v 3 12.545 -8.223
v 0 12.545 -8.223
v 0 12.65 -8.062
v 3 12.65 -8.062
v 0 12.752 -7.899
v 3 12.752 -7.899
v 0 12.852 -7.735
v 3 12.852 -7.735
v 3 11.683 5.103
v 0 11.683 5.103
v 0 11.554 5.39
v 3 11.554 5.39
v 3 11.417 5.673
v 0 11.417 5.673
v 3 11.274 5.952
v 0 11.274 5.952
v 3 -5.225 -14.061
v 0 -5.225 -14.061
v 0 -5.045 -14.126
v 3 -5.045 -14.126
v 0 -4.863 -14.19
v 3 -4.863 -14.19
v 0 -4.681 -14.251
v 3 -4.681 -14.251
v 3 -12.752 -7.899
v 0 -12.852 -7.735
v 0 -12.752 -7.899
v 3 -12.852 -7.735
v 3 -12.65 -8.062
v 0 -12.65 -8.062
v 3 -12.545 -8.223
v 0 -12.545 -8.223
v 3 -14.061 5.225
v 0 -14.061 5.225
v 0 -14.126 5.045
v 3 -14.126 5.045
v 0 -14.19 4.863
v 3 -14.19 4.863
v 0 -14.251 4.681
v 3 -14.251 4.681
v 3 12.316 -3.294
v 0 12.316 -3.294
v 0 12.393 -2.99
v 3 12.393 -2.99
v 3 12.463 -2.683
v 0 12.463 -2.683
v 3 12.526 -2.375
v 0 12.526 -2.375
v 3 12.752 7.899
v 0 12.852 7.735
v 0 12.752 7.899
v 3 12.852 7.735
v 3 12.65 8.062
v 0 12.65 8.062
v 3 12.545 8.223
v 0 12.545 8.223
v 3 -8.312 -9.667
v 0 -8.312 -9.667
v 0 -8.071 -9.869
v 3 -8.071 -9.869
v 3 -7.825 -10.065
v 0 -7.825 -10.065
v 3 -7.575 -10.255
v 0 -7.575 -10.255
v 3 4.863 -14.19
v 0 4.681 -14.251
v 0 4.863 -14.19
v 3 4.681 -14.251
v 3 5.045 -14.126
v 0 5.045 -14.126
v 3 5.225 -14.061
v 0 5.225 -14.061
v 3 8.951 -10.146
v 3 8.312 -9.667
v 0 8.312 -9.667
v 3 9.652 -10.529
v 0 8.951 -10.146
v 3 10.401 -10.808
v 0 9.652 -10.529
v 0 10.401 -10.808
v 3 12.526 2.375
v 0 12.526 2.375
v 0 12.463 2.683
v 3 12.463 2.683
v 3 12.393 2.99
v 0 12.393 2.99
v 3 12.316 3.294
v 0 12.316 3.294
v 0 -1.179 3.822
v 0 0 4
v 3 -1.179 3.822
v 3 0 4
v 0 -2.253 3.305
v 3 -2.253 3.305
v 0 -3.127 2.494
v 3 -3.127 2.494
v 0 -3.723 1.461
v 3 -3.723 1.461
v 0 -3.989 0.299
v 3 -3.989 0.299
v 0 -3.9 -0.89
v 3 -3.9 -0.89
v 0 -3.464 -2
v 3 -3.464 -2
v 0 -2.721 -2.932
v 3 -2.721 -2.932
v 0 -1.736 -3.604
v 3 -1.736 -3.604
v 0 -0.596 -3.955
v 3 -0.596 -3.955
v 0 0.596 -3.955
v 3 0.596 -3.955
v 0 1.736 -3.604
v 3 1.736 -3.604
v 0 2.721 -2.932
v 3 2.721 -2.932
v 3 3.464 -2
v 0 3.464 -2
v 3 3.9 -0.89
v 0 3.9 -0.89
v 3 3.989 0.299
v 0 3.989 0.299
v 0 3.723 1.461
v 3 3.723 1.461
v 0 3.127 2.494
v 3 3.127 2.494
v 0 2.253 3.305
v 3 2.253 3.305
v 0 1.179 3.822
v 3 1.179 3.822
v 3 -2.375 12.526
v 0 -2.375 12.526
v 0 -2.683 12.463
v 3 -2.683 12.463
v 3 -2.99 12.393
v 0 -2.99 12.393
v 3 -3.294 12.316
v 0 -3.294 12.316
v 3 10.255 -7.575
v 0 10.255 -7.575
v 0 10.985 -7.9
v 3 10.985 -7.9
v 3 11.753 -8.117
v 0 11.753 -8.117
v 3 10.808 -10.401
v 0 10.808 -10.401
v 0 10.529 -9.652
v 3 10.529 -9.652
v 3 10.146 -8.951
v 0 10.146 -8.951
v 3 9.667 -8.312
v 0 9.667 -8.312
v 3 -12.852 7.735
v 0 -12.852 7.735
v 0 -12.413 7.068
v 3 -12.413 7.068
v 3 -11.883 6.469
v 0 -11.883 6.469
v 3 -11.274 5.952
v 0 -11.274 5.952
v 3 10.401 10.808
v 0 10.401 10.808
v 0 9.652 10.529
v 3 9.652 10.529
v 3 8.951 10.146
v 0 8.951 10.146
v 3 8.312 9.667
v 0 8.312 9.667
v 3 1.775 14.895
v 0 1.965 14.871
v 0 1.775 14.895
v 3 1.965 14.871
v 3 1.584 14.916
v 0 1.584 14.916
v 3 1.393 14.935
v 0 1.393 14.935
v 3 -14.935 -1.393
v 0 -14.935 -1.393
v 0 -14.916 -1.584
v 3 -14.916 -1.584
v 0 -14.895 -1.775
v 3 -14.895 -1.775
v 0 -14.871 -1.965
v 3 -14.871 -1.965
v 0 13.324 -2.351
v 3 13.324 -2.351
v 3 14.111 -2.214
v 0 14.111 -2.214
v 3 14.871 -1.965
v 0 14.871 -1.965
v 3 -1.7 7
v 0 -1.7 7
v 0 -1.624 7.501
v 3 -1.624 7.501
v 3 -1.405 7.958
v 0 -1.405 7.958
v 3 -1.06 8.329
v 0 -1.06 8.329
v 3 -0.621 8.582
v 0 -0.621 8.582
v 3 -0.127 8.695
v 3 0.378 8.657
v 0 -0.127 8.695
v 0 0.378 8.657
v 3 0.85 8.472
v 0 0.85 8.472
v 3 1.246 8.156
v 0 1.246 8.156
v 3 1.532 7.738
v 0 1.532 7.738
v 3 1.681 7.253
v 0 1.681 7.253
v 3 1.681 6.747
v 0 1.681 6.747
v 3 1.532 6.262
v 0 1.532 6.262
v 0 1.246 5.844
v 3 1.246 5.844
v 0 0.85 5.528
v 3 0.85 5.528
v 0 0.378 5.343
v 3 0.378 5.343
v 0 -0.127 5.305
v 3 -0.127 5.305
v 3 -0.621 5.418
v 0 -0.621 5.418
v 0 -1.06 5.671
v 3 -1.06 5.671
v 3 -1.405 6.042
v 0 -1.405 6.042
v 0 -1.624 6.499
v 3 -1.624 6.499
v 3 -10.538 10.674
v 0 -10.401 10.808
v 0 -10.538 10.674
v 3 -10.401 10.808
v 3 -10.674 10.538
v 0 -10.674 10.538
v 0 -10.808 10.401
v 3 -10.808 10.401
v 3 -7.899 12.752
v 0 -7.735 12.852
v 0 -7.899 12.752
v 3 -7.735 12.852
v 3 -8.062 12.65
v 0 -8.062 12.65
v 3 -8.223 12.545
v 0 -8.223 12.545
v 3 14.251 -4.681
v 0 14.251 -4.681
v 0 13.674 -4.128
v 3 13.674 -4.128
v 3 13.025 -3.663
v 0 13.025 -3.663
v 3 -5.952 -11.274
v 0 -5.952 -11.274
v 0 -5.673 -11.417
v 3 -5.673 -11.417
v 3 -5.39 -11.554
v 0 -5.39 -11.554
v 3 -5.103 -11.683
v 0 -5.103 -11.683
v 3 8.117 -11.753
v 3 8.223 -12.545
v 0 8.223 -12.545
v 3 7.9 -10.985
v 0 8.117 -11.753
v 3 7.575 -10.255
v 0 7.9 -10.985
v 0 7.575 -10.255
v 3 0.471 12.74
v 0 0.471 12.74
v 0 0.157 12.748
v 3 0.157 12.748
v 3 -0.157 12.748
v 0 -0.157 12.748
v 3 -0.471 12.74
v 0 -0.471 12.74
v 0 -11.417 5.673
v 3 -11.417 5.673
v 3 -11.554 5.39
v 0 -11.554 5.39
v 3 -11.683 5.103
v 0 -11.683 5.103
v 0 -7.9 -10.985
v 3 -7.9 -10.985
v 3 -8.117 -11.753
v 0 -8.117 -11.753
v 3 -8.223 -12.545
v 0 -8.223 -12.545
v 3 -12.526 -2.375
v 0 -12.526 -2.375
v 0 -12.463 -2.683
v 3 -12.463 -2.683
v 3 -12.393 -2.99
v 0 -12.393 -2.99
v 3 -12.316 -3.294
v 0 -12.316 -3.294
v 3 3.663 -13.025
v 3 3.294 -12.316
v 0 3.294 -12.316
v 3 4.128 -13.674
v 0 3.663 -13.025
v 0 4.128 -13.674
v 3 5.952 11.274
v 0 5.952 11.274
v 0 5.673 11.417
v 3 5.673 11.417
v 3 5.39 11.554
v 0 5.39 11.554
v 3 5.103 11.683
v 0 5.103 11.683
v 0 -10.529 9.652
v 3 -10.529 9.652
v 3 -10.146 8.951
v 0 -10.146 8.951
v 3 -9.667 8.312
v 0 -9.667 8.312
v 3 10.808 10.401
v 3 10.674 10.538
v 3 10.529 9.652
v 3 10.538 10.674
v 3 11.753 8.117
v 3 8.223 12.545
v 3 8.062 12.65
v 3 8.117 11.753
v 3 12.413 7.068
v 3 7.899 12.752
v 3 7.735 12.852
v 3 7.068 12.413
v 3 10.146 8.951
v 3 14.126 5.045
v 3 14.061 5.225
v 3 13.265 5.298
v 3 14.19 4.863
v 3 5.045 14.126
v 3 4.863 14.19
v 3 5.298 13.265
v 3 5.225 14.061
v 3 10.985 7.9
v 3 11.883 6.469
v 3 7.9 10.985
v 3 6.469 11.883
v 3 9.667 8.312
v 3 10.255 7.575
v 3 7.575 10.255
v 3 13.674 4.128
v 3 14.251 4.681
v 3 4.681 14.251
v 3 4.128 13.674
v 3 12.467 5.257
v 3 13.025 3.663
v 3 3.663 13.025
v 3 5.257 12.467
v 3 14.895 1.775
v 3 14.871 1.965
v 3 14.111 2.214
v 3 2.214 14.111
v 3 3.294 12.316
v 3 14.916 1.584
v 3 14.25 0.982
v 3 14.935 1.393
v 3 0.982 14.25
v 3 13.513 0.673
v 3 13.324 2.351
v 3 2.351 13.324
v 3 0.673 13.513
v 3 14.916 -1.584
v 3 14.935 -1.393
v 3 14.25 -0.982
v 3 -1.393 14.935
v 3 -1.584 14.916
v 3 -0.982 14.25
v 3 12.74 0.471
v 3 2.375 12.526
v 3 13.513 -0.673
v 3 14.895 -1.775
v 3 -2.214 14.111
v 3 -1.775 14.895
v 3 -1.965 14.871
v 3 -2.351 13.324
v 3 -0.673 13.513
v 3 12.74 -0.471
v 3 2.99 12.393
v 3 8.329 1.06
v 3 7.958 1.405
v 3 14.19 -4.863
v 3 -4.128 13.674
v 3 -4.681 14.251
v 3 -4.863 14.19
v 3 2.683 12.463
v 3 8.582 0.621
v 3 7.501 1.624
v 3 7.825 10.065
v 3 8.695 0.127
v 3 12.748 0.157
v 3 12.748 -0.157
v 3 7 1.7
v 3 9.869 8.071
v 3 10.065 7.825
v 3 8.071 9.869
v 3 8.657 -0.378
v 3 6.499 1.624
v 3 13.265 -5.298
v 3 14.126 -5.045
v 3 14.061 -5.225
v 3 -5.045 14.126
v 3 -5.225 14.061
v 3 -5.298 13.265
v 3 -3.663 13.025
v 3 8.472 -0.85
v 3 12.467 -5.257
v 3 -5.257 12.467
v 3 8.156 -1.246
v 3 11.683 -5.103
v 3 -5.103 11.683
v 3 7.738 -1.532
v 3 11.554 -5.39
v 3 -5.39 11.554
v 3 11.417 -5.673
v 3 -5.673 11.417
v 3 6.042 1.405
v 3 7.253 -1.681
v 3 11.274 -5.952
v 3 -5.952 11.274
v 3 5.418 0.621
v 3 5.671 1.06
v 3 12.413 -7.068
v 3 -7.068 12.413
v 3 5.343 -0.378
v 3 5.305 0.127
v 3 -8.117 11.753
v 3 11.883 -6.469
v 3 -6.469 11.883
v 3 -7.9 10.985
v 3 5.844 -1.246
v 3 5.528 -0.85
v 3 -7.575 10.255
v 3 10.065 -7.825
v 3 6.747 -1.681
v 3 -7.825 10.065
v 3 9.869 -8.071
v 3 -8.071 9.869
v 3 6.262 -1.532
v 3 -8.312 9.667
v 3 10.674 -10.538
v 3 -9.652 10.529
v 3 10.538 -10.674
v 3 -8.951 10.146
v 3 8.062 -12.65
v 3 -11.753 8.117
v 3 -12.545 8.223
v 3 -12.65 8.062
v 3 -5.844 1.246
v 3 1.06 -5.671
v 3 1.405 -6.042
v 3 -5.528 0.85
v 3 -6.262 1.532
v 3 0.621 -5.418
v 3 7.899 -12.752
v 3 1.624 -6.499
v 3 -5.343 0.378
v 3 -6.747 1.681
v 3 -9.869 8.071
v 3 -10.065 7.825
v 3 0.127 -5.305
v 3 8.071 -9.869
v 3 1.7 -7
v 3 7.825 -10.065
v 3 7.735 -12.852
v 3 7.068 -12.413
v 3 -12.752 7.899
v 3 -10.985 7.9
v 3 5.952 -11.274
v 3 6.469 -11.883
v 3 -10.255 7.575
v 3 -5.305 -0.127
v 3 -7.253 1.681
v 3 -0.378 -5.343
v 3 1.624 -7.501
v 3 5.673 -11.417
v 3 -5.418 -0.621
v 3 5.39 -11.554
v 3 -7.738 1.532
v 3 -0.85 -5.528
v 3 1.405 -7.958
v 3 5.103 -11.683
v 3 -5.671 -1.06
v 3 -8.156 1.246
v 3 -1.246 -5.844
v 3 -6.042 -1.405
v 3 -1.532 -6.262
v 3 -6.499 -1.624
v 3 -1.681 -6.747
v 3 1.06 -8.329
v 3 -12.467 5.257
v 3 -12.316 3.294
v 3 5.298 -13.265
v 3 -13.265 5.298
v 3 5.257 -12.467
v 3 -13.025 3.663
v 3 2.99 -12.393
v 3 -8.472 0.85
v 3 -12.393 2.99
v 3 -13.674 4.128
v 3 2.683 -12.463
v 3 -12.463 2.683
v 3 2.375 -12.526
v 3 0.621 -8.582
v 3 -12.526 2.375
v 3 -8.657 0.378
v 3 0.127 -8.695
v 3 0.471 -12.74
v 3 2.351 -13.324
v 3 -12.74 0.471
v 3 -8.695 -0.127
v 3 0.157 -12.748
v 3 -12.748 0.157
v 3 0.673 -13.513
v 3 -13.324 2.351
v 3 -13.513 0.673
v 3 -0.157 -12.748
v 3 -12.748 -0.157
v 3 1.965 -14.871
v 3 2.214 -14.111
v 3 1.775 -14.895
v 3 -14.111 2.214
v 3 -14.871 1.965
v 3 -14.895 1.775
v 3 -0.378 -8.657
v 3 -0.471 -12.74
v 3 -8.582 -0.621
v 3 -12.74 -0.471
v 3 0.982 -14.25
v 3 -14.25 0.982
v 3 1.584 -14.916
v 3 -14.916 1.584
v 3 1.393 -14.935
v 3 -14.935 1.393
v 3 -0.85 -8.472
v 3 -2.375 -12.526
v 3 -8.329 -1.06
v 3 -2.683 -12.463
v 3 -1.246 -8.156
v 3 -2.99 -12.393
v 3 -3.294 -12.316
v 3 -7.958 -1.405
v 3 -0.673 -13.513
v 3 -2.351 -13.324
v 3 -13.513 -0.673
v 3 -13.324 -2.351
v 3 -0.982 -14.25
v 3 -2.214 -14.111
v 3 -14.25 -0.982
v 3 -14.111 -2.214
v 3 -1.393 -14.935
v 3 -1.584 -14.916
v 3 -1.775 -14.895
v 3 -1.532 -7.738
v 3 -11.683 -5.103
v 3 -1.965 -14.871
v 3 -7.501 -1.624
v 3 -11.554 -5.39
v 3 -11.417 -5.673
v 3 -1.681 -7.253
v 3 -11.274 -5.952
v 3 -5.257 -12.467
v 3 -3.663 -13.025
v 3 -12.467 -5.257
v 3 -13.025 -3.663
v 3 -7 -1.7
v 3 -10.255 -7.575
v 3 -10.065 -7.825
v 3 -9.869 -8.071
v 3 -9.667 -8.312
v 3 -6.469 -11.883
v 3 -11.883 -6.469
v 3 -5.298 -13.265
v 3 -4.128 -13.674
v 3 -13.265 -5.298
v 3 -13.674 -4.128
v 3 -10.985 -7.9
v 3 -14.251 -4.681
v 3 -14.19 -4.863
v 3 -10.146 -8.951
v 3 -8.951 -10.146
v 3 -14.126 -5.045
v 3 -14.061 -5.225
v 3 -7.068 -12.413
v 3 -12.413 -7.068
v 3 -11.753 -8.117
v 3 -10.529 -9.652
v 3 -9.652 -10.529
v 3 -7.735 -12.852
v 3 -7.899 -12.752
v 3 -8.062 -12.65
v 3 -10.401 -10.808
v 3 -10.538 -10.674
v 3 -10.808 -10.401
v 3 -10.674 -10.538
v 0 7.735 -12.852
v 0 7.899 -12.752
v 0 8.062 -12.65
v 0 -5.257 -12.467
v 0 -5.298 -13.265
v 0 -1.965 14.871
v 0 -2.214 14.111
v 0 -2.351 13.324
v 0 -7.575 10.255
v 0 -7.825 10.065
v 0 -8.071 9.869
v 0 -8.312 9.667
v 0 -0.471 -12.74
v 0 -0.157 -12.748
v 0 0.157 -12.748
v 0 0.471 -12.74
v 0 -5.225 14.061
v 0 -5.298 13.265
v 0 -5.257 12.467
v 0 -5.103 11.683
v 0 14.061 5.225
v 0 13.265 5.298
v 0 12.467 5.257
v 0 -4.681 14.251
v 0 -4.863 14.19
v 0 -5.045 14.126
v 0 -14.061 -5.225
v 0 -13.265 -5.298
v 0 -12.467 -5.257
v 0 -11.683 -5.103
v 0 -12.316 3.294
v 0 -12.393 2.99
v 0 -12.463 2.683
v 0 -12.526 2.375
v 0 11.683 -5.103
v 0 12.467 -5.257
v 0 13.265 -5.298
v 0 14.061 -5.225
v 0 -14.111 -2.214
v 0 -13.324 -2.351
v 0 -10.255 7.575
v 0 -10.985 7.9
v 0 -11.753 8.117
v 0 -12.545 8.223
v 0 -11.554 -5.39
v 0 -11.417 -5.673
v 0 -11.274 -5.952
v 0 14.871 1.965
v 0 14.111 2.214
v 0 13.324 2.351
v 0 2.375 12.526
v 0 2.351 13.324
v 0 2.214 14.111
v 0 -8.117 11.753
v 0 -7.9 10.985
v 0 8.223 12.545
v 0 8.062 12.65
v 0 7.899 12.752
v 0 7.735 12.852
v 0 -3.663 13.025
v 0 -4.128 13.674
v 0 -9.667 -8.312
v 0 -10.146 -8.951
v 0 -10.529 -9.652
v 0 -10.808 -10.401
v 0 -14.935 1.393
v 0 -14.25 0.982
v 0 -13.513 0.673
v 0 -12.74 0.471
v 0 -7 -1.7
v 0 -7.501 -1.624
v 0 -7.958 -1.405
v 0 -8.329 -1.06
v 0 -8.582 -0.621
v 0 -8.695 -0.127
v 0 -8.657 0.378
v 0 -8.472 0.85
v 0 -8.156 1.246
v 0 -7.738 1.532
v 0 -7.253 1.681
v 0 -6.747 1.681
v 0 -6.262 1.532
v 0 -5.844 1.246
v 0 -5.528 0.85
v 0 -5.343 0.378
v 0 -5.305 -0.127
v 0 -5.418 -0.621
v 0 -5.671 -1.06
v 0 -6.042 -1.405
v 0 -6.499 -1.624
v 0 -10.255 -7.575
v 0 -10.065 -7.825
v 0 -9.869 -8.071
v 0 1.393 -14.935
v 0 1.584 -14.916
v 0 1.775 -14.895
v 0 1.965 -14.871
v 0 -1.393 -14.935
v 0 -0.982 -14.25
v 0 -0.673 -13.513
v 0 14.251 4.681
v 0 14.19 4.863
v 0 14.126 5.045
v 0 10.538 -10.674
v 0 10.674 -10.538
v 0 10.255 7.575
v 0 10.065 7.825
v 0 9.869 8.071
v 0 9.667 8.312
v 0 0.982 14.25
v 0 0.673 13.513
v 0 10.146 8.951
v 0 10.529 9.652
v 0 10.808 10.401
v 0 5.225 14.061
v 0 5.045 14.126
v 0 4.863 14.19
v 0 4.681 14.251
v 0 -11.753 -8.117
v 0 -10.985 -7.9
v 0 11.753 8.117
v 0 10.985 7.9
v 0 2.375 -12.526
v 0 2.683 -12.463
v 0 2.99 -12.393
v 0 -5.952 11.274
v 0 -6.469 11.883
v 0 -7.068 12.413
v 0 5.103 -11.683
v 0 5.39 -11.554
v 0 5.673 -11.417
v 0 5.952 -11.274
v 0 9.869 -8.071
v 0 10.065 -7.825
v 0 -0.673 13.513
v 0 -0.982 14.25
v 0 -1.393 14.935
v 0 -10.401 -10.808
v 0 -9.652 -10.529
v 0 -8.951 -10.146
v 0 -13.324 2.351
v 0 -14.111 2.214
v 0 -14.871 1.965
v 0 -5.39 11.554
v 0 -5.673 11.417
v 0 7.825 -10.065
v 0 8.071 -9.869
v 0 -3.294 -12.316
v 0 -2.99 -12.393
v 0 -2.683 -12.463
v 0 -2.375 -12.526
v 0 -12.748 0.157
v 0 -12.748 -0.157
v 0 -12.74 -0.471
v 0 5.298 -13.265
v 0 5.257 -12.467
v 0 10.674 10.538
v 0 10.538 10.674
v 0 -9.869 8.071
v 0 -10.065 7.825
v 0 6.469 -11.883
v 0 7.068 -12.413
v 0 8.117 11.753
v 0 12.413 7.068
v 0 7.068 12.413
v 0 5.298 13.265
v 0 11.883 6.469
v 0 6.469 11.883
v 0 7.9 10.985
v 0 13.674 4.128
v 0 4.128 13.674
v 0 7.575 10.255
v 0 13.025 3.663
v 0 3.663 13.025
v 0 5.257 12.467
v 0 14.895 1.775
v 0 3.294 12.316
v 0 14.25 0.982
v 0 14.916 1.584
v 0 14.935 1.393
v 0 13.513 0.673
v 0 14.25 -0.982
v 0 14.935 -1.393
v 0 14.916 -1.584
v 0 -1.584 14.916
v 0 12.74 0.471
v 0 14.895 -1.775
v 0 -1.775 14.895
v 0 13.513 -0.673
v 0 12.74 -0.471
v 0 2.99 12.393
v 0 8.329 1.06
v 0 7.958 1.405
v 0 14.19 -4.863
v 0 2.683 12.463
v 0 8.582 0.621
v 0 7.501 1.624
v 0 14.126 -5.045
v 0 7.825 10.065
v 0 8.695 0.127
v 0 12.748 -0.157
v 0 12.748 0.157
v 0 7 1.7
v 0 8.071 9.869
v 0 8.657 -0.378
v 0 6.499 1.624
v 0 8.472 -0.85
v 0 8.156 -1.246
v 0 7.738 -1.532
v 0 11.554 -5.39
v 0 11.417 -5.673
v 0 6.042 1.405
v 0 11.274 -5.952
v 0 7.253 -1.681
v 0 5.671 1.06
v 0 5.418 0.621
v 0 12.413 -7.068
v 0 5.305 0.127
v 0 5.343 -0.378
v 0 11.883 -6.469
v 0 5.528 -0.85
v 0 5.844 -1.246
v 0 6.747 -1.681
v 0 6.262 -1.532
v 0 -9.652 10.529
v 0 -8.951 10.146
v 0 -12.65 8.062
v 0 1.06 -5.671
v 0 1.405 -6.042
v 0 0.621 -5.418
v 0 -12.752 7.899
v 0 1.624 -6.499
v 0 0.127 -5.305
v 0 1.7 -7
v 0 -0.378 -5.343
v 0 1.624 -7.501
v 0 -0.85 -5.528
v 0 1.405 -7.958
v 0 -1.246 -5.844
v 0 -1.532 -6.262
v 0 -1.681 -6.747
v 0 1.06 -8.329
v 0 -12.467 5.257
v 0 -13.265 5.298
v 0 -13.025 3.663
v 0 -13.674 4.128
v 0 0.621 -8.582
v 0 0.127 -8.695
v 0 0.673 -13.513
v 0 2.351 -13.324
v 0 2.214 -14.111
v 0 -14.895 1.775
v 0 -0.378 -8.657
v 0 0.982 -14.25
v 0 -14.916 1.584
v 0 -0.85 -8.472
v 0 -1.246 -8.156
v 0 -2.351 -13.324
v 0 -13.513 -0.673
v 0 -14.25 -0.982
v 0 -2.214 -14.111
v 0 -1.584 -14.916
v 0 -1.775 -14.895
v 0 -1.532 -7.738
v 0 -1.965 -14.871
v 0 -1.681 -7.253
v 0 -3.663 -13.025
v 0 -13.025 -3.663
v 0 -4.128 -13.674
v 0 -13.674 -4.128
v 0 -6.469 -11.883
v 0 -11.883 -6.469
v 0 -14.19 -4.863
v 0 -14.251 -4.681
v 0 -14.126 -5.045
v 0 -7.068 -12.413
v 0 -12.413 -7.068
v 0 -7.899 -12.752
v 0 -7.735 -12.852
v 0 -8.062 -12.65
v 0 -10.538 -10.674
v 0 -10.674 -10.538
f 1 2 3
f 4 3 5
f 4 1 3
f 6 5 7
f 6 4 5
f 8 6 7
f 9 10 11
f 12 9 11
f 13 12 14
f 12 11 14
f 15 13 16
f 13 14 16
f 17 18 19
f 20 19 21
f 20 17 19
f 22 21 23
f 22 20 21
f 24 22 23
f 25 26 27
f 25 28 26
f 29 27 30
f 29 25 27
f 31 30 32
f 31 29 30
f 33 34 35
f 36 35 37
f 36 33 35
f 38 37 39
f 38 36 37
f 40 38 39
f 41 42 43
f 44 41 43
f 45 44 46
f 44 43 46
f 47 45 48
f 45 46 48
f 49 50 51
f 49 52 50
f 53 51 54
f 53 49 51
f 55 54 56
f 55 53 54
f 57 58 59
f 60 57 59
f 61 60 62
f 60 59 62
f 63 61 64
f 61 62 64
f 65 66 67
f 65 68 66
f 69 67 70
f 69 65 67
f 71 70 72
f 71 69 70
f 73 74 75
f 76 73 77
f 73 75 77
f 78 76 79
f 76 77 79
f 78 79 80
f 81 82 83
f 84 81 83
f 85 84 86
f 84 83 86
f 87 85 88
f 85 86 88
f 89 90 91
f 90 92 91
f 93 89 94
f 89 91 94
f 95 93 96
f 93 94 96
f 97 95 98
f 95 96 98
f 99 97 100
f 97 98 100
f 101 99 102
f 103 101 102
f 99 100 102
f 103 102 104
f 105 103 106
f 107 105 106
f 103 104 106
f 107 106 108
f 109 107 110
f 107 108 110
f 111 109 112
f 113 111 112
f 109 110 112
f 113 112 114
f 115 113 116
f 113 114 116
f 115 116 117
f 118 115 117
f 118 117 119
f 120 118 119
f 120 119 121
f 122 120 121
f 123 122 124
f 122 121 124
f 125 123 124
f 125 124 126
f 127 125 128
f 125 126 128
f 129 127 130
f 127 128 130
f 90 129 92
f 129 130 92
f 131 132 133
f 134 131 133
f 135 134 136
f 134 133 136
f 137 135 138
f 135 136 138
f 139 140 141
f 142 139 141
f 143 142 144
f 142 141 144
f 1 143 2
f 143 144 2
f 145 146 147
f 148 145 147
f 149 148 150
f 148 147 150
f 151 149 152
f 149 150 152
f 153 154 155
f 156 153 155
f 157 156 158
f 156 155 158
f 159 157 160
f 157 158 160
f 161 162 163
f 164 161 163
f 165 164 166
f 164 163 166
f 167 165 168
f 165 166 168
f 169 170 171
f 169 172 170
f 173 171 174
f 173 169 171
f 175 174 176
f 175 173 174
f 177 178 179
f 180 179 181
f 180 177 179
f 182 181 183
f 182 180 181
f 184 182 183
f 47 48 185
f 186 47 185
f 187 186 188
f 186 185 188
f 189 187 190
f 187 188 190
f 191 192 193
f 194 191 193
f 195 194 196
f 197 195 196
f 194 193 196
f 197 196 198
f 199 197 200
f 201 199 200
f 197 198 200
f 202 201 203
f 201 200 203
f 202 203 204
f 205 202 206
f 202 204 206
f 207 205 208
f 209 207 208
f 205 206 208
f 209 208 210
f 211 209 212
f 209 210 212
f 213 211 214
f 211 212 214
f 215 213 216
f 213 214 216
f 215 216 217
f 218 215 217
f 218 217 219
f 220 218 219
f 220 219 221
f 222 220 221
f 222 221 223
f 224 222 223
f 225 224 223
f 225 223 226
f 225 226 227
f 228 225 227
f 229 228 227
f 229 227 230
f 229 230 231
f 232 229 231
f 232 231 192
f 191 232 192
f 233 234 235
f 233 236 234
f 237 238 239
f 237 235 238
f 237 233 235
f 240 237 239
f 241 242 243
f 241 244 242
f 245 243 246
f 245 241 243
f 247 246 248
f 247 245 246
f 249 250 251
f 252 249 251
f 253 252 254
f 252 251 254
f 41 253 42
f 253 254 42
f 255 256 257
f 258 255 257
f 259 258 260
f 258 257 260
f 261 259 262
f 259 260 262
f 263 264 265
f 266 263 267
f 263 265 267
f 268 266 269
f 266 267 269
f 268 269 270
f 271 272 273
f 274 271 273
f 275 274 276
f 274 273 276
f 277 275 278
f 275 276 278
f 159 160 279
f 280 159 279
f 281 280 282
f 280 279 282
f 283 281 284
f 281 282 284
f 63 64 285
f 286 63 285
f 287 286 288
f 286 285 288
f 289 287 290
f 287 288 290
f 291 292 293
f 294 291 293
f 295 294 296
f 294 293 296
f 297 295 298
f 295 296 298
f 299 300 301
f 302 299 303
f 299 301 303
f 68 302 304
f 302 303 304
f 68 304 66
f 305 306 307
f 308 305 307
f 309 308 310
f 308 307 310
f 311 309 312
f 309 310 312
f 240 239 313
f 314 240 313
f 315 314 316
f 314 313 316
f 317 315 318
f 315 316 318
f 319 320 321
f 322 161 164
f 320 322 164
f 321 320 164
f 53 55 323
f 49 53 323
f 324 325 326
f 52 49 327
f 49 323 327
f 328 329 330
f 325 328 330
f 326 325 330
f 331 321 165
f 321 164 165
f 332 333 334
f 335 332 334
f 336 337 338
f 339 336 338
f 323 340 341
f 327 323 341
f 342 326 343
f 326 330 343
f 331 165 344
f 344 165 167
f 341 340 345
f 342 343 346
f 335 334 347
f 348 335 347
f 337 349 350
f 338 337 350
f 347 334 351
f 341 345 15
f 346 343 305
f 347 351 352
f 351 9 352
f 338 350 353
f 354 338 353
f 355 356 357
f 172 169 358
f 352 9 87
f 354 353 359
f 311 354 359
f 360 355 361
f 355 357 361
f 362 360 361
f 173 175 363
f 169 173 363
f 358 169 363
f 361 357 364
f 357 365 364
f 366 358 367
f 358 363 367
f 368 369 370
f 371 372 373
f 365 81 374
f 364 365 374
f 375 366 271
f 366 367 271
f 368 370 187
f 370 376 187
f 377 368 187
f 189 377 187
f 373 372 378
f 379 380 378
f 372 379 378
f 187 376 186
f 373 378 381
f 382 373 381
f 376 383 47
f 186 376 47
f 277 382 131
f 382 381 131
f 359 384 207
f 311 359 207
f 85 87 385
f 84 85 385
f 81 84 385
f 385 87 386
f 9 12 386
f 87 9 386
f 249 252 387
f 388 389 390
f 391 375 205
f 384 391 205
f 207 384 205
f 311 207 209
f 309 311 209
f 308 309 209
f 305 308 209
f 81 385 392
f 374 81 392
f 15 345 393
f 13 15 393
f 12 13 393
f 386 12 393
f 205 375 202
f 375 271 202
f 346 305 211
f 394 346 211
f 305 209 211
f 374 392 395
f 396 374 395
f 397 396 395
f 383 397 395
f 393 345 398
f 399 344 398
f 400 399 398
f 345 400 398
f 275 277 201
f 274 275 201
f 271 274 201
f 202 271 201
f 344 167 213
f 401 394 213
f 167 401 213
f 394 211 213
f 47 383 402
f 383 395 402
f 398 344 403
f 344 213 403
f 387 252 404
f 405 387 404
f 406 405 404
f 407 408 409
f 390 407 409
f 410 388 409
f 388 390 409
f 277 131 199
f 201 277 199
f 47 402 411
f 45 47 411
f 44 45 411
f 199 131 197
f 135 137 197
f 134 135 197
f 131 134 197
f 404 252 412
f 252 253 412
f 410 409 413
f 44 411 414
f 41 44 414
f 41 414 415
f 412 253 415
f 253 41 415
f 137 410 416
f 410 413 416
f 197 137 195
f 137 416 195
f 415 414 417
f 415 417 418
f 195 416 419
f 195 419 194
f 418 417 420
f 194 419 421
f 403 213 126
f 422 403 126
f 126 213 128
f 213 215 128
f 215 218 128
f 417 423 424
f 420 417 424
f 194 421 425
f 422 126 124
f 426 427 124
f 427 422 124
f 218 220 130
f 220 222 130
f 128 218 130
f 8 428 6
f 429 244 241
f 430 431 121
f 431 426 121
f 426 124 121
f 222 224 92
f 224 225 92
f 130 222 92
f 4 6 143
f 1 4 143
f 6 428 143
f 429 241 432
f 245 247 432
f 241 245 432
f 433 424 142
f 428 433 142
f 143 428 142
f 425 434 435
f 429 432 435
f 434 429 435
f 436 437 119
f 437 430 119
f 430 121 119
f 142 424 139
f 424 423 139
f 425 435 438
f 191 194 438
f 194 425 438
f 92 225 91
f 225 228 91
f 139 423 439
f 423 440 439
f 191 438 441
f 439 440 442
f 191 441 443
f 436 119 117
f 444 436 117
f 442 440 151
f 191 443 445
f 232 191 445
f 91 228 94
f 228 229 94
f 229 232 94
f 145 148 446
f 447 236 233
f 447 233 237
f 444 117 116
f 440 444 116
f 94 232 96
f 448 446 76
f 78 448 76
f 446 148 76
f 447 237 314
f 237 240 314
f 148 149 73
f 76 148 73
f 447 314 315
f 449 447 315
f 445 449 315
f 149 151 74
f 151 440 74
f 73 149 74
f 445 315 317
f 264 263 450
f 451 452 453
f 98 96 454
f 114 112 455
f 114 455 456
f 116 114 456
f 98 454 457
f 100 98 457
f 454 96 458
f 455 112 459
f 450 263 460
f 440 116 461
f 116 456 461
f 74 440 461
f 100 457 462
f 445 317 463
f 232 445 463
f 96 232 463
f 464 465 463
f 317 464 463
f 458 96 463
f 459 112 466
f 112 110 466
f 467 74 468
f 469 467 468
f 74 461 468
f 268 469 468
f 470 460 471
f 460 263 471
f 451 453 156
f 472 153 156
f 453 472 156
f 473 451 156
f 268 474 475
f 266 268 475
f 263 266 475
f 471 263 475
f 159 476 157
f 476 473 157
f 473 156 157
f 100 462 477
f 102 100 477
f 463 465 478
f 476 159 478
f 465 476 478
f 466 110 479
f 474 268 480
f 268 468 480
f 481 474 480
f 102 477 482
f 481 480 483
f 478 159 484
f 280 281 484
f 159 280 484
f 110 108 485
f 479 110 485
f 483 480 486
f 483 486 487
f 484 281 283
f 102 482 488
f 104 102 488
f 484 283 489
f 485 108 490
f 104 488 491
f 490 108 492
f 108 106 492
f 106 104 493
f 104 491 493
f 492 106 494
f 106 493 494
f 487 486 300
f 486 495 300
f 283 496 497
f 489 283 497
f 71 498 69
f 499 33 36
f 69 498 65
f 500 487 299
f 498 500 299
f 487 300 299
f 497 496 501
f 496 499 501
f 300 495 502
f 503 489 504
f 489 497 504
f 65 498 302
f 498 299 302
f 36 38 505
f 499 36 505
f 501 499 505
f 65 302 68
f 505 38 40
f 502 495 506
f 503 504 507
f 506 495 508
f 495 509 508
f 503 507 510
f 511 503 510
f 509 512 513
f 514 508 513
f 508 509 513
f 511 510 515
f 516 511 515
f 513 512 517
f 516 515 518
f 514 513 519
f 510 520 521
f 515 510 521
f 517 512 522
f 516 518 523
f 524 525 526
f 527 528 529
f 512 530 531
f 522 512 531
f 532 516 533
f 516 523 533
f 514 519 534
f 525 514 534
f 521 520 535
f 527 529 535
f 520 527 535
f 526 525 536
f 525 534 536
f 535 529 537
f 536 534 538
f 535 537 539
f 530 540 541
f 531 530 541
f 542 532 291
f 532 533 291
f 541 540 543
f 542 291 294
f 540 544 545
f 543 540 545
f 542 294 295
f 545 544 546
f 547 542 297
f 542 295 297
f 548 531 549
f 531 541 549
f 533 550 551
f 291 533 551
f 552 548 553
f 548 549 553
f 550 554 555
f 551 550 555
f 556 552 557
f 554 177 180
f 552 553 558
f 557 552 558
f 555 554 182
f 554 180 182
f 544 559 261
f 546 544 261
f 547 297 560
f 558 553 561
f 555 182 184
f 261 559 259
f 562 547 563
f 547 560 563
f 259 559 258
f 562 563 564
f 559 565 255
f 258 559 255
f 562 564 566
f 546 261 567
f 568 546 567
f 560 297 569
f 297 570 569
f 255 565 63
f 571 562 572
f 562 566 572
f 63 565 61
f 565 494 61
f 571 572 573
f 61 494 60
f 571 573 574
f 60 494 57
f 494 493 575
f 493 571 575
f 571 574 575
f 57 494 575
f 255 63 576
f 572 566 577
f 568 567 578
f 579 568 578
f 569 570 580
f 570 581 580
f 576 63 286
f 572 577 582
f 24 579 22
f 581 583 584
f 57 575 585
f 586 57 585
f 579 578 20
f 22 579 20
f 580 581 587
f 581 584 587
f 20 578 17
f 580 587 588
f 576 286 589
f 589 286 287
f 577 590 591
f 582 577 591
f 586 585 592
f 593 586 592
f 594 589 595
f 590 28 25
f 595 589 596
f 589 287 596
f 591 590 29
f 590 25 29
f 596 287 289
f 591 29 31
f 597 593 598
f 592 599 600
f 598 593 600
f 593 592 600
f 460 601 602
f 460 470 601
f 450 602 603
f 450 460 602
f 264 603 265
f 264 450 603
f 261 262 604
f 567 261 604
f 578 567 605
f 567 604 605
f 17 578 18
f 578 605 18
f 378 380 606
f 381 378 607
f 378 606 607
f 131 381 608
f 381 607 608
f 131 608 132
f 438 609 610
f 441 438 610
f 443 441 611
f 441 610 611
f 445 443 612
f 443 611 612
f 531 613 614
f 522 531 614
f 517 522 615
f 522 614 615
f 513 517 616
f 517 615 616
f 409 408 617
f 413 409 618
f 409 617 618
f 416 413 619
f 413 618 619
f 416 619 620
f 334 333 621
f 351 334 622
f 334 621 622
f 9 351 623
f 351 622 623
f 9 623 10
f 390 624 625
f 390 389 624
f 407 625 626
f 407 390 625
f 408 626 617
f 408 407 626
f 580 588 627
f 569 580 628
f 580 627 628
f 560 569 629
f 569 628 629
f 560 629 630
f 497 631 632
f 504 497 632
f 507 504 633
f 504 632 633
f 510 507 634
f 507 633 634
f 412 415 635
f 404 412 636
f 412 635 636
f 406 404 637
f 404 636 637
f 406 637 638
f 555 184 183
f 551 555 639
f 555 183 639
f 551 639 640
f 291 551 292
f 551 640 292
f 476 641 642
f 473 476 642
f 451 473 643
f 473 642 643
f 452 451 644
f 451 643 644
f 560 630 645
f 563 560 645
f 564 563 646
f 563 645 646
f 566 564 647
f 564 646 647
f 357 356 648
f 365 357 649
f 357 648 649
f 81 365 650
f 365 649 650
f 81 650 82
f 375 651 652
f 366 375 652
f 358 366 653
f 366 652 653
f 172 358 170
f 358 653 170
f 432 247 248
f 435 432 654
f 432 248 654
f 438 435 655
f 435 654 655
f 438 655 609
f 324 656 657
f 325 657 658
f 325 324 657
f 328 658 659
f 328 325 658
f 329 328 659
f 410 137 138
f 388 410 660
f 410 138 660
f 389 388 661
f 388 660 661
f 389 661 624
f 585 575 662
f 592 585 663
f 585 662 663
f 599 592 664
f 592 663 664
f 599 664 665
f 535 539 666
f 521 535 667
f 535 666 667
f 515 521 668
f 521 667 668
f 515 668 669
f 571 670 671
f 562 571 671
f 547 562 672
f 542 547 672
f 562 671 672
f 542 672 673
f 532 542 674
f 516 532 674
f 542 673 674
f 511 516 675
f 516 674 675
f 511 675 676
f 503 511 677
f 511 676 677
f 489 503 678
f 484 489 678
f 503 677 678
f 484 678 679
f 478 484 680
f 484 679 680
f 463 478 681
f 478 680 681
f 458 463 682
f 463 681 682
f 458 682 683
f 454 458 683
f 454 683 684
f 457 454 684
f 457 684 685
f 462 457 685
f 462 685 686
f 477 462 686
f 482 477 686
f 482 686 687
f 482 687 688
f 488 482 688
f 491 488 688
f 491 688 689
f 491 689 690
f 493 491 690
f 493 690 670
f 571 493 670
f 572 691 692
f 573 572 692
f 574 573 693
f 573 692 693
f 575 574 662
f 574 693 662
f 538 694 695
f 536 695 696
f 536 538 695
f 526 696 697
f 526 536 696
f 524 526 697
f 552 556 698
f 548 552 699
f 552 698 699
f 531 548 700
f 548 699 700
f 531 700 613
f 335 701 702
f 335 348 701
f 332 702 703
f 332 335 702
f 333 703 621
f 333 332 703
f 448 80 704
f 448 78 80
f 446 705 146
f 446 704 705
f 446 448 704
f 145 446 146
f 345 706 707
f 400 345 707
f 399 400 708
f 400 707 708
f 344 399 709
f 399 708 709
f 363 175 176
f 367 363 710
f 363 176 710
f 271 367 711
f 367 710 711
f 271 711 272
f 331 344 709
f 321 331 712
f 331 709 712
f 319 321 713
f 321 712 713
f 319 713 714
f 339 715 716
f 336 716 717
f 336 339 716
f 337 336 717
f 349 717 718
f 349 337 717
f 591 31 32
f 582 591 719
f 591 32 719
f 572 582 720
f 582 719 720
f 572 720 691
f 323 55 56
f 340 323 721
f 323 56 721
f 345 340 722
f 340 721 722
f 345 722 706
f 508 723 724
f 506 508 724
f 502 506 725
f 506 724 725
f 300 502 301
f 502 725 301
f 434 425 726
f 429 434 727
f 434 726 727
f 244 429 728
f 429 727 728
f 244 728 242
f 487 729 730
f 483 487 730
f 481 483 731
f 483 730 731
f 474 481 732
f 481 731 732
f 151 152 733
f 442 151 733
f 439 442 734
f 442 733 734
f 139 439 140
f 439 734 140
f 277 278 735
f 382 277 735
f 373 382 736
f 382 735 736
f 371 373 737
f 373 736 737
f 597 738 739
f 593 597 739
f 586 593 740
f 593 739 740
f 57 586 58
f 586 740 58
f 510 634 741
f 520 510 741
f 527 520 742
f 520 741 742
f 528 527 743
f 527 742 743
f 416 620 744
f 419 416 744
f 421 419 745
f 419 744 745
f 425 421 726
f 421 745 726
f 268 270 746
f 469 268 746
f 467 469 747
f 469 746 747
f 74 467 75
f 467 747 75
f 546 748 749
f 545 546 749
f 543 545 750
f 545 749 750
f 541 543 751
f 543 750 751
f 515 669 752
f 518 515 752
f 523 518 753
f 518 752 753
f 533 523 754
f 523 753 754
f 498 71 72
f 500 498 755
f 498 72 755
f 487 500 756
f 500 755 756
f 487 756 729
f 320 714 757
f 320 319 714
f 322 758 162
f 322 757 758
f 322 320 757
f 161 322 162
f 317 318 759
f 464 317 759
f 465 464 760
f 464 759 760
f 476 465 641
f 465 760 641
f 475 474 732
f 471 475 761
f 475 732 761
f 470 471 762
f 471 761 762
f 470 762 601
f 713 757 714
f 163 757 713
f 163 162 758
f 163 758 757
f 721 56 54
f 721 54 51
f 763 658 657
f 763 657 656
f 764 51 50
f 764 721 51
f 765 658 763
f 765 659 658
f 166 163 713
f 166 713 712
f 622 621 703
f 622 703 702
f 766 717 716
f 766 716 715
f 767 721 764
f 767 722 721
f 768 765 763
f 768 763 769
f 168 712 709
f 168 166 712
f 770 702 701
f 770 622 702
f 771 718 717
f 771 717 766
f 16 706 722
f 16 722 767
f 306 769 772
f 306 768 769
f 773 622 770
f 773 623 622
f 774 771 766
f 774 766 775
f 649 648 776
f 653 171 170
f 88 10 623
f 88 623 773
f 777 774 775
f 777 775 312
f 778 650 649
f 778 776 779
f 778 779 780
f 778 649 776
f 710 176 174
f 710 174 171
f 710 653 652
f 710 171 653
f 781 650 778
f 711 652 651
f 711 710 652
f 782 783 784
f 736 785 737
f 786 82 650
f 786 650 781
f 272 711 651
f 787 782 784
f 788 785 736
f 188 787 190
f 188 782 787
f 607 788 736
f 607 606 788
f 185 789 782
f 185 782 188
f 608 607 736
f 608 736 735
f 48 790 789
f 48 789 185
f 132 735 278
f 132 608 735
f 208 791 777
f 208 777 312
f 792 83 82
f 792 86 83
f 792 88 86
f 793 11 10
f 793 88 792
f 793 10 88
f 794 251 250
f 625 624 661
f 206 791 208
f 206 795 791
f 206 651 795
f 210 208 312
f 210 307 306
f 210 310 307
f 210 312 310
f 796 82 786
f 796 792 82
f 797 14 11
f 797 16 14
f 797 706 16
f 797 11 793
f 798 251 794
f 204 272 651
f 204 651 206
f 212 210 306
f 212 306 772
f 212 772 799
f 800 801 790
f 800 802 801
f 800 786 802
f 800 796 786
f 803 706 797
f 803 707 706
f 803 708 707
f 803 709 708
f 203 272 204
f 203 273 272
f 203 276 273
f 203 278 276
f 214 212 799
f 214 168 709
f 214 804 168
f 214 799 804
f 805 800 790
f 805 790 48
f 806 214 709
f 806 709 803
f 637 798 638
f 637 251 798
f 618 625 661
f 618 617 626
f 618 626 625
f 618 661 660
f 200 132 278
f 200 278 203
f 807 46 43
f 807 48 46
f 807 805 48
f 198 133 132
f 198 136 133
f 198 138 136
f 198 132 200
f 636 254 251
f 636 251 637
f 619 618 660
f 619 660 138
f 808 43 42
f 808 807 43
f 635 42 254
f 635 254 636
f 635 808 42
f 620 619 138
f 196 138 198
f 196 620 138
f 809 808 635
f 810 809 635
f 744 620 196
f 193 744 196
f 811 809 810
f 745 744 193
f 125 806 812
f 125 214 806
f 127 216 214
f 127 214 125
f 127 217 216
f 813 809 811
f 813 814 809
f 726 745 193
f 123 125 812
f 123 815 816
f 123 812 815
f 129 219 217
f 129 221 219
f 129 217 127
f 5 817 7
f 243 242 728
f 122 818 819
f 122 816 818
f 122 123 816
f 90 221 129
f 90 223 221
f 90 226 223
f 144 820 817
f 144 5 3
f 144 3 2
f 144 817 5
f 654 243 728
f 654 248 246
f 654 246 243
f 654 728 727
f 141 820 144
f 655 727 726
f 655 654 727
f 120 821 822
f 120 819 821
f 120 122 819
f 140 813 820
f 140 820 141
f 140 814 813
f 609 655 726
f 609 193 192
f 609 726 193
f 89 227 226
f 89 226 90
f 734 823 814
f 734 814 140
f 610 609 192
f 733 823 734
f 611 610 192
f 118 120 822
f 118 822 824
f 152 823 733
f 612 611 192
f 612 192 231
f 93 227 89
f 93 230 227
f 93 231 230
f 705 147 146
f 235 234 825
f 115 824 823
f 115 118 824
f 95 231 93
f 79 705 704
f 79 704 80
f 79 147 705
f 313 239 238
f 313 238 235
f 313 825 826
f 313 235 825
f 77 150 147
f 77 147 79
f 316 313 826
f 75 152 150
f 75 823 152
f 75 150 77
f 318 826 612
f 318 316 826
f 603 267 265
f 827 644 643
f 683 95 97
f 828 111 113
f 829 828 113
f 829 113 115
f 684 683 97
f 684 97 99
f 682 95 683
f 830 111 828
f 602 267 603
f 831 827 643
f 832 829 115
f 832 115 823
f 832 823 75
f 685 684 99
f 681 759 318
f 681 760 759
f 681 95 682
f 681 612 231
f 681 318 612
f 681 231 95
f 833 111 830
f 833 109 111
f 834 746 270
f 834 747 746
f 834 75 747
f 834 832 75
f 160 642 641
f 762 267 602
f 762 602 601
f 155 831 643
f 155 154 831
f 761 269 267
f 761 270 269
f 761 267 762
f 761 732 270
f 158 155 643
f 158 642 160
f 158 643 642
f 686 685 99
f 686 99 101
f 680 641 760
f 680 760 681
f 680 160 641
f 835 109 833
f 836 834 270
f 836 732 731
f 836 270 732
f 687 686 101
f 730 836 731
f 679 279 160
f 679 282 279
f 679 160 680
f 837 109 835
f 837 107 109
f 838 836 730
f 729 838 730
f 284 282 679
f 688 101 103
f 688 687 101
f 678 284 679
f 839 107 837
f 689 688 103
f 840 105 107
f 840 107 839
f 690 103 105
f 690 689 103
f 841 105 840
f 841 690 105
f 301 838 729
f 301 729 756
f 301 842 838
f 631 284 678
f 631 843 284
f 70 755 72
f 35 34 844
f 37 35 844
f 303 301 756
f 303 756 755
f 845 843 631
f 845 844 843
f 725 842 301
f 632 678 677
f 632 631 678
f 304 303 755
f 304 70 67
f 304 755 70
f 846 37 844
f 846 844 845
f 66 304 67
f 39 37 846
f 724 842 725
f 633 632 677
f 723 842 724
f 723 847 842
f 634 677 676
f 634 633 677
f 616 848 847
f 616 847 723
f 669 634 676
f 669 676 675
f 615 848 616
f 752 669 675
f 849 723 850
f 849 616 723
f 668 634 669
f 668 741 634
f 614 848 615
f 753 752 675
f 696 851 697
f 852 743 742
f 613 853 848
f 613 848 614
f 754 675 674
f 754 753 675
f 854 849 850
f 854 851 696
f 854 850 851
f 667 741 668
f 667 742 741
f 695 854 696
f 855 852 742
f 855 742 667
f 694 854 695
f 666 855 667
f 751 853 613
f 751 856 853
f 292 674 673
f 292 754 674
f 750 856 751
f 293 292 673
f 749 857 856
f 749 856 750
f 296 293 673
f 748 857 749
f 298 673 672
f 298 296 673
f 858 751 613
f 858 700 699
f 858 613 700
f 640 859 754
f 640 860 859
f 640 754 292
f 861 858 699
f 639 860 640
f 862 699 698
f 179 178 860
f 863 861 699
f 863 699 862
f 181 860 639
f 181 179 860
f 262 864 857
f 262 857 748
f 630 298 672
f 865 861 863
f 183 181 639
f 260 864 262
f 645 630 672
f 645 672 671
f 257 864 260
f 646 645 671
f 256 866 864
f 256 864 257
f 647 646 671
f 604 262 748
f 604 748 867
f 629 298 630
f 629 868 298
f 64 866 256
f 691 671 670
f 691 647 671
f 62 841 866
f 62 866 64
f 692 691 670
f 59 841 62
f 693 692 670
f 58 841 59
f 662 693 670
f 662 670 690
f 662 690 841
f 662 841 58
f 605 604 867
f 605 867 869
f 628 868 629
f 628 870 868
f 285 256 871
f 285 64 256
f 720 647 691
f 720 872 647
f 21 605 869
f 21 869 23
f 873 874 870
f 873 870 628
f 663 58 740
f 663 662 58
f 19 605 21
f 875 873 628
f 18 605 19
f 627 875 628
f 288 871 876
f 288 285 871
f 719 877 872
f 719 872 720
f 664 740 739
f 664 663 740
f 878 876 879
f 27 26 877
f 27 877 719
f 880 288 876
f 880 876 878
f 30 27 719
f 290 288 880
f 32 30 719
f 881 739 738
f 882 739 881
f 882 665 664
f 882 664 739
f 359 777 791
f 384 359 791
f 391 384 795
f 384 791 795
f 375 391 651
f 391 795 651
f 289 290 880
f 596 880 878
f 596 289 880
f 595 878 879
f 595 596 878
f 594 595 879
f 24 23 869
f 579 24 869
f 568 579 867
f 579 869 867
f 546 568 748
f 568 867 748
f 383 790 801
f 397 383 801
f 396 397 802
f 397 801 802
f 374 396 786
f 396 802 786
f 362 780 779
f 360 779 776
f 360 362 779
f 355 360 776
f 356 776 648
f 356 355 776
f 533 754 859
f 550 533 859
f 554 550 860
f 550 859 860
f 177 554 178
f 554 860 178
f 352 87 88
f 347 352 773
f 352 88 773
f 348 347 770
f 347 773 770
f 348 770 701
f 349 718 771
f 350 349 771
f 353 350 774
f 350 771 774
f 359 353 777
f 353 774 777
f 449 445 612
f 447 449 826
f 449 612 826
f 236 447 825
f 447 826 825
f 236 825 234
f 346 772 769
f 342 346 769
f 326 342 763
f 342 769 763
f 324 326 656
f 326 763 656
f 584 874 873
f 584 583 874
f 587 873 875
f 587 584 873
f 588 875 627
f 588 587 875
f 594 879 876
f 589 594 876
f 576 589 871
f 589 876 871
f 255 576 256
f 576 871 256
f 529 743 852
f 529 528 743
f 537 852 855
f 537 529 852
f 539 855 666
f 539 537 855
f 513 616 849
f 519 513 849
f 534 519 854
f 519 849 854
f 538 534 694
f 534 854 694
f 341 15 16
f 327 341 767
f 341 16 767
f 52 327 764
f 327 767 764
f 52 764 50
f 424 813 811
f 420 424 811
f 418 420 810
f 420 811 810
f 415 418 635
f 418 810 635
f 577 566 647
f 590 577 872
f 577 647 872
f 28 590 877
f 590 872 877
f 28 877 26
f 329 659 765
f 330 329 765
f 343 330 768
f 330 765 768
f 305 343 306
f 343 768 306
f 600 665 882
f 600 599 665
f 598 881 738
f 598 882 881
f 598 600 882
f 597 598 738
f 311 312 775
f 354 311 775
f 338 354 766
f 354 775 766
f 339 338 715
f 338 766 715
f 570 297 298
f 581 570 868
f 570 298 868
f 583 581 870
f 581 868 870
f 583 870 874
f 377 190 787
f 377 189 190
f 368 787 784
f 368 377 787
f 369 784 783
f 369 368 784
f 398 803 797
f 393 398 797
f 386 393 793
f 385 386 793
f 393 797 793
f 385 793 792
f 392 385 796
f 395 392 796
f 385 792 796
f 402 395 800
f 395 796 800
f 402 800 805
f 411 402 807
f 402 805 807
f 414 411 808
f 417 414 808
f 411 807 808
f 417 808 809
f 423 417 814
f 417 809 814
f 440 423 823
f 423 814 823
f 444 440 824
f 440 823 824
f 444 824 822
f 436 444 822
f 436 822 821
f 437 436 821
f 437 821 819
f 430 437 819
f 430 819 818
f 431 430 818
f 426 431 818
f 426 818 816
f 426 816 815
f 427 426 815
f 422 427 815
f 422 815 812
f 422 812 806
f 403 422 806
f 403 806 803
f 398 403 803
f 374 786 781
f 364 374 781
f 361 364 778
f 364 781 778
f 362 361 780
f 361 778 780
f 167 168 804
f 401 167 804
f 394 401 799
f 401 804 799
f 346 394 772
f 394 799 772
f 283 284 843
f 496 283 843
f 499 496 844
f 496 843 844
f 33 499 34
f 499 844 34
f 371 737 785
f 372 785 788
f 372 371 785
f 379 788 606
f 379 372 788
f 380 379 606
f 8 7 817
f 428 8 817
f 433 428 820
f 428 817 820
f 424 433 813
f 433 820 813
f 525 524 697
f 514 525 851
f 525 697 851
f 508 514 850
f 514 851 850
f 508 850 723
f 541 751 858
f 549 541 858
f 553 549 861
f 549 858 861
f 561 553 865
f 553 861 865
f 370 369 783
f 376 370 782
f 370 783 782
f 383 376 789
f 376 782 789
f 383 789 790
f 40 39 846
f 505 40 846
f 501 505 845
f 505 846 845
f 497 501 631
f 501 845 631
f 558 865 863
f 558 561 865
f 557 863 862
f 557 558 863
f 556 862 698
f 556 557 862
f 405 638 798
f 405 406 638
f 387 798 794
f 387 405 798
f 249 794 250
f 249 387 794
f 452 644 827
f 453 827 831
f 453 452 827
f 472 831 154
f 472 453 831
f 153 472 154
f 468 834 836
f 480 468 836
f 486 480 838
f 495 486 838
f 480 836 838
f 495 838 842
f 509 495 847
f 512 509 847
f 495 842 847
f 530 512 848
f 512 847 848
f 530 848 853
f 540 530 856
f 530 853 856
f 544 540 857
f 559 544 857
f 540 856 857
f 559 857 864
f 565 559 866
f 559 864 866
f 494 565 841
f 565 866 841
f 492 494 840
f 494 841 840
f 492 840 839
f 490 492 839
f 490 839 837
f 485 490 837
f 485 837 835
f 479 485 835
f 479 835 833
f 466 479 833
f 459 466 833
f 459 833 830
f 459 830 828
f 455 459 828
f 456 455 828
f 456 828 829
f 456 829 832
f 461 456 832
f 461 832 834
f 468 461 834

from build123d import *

# Parameters (mm, degrees)
BASPROSKE_W          = 3
BASPROSKE_H          = 15
TOOTHCUT_DEPTH       = 22.424285286
TEETHCUTS_COUNT      = 28
TEETHCUTS_ANGLE      = 347.142857143
BORSKE_R             = 4
BORE_DEPTH           = 50.0000508
M3_CLEARANCE_HOLE1_D = 3.4
CIRPATTERN1_COUNT    = 4


with BuildPart() as part:
    # BasProSke → Base-Revolve (revolve)
    with BuildSketch(Plane(origin=(0, 0, 0), x_dir=(1, 0, 0), z_dir=(0, 1, 0)), mode=Mode.PRIVATE) as base_revolve_sk:
        with Locations((1.5, 7.5)):
            Rectangle(BASPROSKE_W, BASPROSKE_H)
    revolve(base_revolve_sk.sketch.rotate(Axis((-10, 0, 0), (1, 0, 0)), 180), axis=Axis((-10, 0, 0), (1, 0, 0)))

    # TooCutSke → ToothCut (cut, through all)
    with BuildSketch(Plane(origin=(0, 0, 0), x_dir=(0, 0, -1), z_dir=(1, 0, 0))):
        with BuildLine():
            ThreePointArc((0.471336039, 12.740284272), (0, 12.749), (-0.471336039, 12.740284272))
            ThreePointArc((-0.471336039, 12.740284272), (-0.81983923, 13.900763331), (-1.409805137, 14.959114099))
            ThreePointArc((-1.409805137, 14.959114099), (0, 15.0254), (1.409805137, 14.959114099))
            ThreePointArc((1.409805137, 14.959114099), (0.81983923, 13.900763331), (0.471336039, 12.740284272))
        make_face()
    toothcut = extrude(amount=TOOTHCUT_DEPTH, mode=Mode.SUBTRACT)

    # TeethCuts: ToothCut ×28 about axis
    teethcuts_axis = Axis((-10, 0, 0), (1, 0, 0))
    for i in range(1, TEETHCUTS_COUNT):
        add(toothcut.rotate(teethcuts_axis, i * TEETHCUTS_ANGLE / (TEETHCUTS_COUNT - 1)), mode=Mode.SUBTRACT)

    # BorSke → Bore (cut, symmetric)
    with BuildSketch(Plane(origin=(0, 0, 0), x_dir=(0, 0, -1), z_dir=(1, 0, 0))):
        with Locations(Location((0, 0, 0), (0, 0, 180))):
            Circle(BORSKE_R)
    extrude(amount=BORE_DEPTH, both=True, mode=Mode.SUBTRACT)

    # M3 Clearance Hole1 (through all)
    with Locations(Plane(origin=(3, 0, 0), x_dir=(0, 0, -1), z_dir=(1, 0, 0))):
        with Locations((0, 7)):
            m3_clearance_hole1 = Hole(M3_CLEARANCE_HOLE1_D / 2)

    # CirPattern1: M3 Clearance Hole1 ×4 about axis
    cirpattern1_axis = Axis((0, 0, 0), (1, 0, 0))
    for i in range(1, CIRPATTERN1_COUNT):
        add(m3_clearance_hole1.rotate(cirpattern1_axis, i * 360 / CIRPATTERN1_COUNT), mode=Mode.SUBTRACT)


solid = part.part
